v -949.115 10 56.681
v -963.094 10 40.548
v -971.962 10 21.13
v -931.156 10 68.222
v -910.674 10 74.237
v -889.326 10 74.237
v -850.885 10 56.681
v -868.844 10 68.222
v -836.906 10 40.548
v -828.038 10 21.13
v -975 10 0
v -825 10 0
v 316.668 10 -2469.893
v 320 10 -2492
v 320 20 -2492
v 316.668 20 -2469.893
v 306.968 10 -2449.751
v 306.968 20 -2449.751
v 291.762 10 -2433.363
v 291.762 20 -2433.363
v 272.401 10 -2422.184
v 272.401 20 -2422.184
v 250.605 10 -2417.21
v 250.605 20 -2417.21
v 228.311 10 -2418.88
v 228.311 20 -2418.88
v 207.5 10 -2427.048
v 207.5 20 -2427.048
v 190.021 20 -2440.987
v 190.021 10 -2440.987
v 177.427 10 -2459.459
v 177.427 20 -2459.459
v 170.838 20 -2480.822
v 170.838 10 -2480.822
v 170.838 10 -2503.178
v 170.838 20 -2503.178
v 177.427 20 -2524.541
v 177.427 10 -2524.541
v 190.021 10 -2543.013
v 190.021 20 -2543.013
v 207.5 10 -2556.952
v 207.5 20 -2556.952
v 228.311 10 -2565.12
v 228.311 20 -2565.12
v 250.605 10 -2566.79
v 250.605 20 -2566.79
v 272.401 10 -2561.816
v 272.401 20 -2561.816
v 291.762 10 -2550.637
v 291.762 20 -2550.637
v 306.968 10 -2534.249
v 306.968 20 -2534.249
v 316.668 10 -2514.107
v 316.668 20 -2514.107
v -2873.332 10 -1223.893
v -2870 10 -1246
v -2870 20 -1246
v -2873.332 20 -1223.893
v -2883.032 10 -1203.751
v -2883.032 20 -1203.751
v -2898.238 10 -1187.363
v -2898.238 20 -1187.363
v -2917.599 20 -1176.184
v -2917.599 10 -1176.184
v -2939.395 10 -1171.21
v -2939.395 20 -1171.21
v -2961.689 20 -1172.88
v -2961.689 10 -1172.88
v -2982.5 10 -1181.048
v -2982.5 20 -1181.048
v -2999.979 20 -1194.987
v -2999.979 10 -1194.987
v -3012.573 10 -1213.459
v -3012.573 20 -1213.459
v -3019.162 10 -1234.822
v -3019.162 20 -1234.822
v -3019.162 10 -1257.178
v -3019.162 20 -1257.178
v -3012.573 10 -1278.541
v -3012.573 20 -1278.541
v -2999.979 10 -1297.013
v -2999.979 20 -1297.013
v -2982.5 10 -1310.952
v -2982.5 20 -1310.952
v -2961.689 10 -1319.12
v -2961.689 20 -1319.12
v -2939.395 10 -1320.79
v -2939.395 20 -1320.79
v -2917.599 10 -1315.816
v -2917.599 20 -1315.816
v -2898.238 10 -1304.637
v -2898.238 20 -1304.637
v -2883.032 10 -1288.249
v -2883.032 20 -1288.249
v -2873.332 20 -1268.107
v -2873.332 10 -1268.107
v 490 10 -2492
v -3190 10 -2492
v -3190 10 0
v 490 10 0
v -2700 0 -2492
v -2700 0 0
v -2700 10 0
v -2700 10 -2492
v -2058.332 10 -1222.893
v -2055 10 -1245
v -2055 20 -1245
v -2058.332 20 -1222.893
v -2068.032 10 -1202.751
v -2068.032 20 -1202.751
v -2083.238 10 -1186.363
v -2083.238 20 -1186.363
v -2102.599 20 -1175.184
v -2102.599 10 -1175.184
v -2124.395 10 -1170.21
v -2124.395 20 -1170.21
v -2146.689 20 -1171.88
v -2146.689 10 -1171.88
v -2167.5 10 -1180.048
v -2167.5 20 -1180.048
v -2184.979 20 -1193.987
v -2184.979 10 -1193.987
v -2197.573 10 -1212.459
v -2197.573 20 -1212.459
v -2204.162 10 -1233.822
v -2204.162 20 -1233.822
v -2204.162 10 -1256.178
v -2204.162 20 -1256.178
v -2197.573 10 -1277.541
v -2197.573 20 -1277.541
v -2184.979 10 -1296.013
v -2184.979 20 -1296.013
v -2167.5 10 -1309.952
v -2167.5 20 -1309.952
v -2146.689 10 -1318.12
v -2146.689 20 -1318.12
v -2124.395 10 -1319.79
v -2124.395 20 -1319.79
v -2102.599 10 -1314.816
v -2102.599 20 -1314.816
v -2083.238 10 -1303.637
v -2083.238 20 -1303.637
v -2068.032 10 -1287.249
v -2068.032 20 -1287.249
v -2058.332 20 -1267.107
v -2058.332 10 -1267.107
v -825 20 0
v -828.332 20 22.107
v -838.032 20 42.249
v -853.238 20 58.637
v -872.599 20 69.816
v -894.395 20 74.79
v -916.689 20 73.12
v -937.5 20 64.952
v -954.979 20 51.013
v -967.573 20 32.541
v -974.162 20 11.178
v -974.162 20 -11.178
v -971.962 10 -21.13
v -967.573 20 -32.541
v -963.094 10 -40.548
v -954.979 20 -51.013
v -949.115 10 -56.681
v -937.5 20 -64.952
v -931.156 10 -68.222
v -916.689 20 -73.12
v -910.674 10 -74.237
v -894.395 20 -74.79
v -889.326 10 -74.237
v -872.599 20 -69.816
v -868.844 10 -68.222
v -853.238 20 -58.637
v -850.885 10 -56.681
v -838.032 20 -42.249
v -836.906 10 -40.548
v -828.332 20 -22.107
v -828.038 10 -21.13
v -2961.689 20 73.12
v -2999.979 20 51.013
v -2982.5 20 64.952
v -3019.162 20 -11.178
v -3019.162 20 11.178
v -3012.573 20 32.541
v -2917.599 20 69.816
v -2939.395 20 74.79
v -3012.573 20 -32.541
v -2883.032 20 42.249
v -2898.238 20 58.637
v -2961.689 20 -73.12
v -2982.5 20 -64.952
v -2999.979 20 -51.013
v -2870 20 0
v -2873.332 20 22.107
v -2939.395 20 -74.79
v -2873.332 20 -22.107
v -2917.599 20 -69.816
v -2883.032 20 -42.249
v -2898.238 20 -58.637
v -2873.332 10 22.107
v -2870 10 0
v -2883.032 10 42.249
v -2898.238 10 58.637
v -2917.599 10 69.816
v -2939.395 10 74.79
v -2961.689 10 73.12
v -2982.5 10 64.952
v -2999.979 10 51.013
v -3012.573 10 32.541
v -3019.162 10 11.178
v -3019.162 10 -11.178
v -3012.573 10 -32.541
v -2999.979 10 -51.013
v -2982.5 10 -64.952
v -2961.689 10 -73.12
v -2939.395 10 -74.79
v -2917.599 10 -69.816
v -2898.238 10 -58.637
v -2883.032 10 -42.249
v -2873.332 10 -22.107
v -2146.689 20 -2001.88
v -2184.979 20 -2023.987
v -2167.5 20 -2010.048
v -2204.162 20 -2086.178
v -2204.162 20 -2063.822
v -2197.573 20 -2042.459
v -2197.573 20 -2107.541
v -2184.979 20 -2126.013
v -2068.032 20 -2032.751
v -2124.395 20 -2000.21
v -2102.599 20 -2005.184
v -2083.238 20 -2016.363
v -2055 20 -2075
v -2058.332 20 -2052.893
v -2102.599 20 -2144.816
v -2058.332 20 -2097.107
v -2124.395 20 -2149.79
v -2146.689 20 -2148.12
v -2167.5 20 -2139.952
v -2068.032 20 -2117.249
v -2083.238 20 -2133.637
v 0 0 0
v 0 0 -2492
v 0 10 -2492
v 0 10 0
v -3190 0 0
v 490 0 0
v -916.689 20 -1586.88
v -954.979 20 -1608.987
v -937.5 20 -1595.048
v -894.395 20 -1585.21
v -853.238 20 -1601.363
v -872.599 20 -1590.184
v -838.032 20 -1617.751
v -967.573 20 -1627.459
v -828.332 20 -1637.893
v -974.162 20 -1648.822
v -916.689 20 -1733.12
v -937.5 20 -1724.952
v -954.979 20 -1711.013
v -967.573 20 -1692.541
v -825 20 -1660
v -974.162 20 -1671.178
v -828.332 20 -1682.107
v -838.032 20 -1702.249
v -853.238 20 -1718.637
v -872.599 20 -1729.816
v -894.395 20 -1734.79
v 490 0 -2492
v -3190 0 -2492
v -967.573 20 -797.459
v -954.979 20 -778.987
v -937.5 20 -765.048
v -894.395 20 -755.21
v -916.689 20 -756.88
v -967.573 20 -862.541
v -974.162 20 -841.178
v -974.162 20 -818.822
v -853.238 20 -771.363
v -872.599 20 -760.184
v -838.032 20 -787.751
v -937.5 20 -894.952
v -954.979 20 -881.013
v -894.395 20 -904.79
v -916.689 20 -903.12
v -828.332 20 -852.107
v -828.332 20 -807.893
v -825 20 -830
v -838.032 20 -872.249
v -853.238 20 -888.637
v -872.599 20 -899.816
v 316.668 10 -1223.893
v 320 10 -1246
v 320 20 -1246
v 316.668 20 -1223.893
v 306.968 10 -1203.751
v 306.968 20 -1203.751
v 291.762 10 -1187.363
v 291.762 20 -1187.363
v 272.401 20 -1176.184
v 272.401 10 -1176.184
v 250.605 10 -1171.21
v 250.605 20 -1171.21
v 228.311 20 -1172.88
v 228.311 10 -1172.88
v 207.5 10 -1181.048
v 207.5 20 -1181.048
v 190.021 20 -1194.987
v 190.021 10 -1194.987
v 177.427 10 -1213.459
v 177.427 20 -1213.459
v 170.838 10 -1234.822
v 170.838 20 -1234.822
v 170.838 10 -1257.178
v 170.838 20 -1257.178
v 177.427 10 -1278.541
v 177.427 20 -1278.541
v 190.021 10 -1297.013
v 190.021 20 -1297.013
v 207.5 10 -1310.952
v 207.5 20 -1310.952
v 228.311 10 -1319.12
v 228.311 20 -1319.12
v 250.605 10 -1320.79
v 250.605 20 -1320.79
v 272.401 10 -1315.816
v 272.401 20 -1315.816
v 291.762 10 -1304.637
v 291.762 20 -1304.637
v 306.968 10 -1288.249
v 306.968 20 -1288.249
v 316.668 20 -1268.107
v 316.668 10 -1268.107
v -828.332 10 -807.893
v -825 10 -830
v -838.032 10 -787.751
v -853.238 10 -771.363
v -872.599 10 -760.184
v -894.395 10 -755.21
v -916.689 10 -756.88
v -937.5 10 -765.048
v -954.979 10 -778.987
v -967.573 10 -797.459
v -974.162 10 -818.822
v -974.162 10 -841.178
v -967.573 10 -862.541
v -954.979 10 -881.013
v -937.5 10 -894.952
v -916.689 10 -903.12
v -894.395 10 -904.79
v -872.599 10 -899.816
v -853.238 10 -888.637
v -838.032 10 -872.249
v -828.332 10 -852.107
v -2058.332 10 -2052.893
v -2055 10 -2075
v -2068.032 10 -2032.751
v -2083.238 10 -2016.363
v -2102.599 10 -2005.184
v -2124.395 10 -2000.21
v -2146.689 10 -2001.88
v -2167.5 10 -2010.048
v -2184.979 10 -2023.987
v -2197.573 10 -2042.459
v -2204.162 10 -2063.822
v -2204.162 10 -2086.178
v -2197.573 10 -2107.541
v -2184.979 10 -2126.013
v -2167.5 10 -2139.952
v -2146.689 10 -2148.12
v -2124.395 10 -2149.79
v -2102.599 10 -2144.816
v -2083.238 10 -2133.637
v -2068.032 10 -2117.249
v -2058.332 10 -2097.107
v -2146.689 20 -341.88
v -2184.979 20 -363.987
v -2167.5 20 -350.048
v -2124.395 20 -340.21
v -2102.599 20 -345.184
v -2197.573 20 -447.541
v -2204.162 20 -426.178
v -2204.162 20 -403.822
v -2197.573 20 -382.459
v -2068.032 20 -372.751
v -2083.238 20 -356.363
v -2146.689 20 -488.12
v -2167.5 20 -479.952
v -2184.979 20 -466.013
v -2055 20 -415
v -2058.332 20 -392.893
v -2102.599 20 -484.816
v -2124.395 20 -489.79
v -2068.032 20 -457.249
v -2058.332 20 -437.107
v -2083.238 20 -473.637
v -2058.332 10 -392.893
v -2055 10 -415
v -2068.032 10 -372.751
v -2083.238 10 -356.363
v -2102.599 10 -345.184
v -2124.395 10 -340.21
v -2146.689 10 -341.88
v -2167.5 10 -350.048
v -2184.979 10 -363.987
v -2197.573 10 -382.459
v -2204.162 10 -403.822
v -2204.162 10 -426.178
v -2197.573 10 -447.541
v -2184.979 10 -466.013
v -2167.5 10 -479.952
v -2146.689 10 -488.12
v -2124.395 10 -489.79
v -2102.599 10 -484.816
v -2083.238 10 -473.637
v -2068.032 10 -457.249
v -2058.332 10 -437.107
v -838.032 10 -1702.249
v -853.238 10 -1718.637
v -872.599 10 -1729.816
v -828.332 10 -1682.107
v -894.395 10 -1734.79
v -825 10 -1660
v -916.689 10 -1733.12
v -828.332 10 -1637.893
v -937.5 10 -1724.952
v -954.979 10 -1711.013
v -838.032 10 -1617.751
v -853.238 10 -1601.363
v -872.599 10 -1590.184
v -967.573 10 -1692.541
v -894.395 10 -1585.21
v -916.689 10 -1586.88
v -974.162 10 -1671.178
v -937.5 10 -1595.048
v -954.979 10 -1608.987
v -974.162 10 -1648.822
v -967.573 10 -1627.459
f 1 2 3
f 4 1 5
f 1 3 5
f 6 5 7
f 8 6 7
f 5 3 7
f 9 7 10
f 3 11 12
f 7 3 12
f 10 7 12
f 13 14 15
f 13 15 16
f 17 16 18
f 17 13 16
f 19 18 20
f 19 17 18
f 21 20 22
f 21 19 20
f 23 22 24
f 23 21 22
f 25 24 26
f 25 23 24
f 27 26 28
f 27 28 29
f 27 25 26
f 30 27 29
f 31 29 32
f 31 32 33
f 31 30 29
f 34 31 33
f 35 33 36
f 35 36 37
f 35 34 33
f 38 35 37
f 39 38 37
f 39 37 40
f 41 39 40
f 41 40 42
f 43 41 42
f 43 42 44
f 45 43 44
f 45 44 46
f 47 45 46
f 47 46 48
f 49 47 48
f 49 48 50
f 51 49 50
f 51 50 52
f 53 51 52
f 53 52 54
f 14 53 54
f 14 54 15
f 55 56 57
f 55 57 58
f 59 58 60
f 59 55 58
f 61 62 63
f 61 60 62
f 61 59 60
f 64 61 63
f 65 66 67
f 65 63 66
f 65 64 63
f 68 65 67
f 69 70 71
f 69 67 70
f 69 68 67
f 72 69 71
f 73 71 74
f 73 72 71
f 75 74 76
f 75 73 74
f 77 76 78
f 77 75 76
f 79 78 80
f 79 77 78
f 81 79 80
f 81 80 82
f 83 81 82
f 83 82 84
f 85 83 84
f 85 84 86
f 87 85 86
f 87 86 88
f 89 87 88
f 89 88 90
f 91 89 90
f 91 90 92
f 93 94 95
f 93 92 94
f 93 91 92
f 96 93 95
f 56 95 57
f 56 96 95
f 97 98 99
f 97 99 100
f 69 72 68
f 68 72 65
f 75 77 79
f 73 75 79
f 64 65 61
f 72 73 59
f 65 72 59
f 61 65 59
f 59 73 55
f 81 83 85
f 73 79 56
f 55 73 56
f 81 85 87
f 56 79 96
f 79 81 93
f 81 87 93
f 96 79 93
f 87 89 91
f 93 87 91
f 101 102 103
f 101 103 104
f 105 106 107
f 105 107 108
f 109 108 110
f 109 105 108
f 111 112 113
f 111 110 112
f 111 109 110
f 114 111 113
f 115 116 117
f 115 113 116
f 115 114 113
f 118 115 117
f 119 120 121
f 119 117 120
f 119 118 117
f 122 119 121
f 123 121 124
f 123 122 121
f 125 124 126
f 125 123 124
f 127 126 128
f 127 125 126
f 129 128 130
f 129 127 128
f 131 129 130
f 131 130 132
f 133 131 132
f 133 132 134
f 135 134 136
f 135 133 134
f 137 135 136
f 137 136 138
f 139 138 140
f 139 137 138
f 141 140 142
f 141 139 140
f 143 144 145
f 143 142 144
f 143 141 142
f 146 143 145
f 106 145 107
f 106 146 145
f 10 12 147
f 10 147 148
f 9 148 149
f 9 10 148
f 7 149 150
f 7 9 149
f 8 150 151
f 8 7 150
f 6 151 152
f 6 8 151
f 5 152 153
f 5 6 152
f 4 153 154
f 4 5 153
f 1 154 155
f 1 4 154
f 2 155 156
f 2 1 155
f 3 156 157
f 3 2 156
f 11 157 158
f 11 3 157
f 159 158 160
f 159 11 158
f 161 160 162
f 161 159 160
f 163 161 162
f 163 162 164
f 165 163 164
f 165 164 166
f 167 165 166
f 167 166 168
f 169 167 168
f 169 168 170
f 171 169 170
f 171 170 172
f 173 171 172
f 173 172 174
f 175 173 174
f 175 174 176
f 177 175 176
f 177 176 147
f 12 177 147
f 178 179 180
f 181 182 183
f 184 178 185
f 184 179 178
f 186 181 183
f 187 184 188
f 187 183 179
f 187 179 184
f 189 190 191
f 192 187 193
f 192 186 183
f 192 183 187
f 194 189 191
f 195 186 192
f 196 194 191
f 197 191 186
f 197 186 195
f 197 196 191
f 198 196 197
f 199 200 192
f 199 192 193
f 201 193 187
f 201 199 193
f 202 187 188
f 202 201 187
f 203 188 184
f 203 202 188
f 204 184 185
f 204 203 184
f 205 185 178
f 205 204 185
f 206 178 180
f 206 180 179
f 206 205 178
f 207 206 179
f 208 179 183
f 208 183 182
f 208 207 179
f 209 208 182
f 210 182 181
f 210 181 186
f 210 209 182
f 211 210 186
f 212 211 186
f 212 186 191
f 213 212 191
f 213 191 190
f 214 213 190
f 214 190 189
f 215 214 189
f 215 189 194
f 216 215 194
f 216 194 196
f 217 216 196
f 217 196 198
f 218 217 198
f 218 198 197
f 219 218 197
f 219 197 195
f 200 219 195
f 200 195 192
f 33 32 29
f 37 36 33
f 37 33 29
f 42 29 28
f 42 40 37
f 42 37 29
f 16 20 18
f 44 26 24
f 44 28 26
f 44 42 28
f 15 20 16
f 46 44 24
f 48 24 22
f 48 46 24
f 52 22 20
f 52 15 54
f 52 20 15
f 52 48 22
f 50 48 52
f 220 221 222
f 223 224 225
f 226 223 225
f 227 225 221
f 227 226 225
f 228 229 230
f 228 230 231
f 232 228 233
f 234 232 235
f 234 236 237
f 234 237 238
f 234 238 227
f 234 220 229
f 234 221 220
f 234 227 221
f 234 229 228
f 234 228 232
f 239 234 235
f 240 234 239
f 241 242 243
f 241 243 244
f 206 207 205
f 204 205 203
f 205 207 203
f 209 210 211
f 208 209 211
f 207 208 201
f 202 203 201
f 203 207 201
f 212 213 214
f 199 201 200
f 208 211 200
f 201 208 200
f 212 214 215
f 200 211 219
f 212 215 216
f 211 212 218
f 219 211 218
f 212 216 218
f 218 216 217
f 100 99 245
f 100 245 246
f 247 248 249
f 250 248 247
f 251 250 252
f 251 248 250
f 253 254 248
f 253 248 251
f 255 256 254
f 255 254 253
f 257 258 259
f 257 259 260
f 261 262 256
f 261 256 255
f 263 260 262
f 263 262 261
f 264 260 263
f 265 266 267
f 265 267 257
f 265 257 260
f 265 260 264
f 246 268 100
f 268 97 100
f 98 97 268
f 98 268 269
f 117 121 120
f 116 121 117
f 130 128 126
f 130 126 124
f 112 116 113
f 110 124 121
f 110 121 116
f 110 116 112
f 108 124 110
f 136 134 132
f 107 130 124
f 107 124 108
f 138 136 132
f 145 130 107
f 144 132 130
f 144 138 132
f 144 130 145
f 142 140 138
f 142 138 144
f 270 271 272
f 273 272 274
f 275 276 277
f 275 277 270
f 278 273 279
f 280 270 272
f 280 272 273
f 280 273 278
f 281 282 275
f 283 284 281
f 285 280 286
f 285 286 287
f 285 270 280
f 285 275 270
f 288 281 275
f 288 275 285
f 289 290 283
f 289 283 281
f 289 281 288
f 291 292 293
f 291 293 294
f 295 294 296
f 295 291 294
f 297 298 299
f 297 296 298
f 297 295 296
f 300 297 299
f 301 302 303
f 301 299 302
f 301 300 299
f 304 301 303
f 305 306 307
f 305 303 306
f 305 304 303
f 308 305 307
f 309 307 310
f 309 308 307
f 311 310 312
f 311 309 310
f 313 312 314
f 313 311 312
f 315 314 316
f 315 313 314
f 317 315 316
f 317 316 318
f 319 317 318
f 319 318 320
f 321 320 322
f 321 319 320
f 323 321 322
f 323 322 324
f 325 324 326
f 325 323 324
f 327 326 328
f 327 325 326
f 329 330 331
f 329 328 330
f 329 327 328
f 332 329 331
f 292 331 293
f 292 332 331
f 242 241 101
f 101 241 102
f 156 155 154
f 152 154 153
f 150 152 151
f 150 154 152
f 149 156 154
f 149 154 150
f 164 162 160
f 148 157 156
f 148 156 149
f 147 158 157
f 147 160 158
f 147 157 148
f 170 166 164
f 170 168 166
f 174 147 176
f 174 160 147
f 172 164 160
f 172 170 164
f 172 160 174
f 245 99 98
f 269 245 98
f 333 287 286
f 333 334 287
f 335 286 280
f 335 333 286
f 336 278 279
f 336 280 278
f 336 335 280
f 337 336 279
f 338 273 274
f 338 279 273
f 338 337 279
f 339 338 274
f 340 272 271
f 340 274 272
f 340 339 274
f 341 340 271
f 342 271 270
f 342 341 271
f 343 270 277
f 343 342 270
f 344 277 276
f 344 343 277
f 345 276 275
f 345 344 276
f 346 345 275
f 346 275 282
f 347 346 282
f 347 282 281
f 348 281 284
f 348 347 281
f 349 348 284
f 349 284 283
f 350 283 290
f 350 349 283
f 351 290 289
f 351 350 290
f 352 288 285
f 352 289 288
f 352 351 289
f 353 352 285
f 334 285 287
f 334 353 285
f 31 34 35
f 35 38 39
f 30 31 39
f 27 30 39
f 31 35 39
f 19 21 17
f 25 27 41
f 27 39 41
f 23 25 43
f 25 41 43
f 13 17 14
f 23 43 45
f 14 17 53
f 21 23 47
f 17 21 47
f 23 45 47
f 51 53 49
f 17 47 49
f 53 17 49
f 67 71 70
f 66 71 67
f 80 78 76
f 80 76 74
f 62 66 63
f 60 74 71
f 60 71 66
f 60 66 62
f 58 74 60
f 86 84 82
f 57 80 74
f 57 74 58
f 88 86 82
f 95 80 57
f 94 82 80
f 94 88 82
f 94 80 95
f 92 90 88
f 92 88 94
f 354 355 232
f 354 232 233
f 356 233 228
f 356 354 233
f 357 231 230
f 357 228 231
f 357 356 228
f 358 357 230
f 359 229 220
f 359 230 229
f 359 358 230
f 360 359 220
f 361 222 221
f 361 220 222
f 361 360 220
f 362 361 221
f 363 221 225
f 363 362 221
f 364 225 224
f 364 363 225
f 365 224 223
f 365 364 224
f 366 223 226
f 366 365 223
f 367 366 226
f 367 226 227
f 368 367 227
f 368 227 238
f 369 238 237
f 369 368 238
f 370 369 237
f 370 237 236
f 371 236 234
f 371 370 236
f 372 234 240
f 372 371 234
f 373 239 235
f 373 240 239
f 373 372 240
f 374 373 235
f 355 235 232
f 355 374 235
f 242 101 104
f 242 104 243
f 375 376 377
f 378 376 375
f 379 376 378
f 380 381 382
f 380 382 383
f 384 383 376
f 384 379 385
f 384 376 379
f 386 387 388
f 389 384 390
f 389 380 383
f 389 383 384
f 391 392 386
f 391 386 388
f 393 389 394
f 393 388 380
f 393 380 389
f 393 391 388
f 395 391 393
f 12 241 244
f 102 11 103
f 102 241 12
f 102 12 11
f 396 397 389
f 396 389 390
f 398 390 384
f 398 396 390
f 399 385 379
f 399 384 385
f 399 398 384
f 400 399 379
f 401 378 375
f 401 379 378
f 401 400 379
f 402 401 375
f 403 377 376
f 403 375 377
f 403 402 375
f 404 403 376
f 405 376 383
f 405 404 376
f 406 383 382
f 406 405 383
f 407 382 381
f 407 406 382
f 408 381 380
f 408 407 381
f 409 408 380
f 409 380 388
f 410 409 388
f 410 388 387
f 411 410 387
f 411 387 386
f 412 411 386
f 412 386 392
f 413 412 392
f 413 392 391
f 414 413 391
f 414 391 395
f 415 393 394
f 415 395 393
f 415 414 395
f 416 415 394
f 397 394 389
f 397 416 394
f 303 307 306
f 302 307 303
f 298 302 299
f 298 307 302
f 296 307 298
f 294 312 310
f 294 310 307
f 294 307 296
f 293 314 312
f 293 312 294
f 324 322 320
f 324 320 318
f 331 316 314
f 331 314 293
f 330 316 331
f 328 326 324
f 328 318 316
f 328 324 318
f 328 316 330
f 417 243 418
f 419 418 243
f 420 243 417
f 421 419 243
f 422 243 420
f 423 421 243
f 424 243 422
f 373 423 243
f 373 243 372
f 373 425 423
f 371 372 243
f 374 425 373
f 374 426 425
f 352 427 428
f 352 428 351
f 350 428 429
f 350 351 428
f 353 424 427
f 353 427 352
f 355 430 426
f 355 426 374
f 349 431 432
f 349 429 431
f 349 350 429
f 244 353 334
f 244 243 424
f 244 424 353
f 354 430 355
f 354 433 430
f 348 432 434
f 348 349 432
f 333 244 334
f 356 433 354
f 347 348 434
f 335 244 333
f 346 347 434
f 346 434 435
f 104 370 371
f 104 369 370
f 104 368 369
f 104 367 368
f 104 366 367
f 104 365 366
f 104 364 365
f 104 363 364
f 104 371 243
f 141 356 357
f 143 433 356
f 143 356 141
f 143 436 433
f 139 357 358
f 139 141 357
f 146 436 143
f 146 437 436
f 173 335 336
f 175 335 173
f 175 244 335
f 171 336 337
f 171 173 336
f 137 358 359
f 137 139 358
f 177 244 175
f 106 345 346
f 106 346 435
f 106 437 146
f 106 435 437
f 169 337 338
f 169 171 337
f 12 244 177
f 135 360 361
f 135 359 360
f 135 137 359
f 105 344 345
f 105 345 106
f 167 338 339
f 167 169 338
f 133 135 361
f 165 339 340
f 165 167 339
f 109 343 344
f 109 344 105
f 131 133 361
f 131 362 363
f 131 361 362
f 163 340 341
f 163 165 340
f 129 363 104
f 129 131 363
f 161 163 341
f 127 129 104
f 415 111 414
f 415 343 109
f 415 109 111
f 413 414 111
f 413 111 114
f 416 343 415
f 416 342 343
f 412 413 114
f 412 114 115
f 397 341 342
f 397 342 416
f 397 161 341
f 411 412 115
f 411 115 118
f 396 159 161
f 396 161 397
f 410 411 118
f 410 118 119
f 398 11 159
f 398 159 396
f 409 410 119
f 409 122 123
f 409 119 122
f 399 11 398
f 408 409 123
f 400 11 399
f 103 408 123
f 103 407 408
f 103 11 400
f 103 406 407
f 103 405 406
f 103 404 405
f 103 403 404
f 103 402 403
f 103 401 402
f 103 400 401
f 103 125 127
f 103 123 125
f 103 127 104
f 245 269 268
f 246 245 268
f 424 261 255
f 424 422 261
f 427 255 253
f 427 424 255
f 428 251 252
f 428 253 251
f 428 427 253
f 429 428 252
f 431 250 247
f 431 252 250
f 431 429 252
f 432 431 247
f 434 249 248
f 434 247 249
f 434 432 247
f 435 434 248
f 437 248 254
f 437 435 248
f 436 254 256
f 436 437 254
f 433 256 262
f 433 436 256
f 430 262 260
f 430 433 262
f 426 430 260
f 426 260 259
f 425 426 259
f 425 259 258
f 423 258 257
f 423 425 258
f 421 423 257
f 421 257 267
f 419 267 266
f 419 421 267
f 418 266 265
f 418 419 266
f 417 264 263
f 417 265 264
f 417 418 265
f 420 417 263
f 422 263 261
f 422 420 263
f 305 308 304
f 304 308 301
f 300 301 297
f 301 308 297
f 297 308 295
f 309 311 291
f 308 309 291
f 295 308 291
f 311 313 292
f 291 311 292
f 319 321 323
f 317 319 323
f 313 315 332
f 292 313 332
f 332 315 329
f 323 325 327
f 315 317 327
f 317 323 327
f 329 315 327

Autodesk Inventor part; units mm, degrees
ref_plane "YZ Plane" through (0, 0, 0) normal (1, 0, 0) x (0, 1, 0)
ref_plane "XZ Plane" through (0, 0, 0) normal (0, 1, 0) x (-1, 0, 0)
ref_plane "XY Plane" through (0, 0, 0) normal (0, 0, 1) x (1, 0, 0)
sketch "Sketch1" plane through (0, 0, 0) normal (0, 1, 0) x (-1, 0, 0)
  line L0 (0, 0) -> (2700, 0)
  line L1 (2700, 0) -> (2700, -2492)
  line L2 (2700, -2492) -> (0, -2492)
  line L3 (0, -2492) -> (0, 0)
  dimension "d0" = 2700
  dimension "d1" = 2492
extrude "Extrusion1" add sketch "Sketch1" along normal blind 10
sketch "Sketch2" plane through (0, 10, 0) normal (0, 1, 0) x (1, 0, 0)
  line L0 (-2700, 2492) -> (-2700, 0) projected
  line L1 (-2700, 0) -> (-3190, 0)
  line L2 (-3190, 0) -> (-3190, 2492)
  line L3 (-3190, 2492) -> (-2700, 2492)
  line L4 (-2700, 2492) -> (-2700, 0)
  line L5 (0, 2492) -> (-2700, 2492) projected
  line L6 (0, 0) -> (0, 2492) projected
  line L7 (0, 2492) -> (490, 2492)
  line L8 (490, 2492) -> (490, 0)
  line L9 (490, 0) -> (0, 0)
  line L10 (0, 0) -> (0, 2492)
  line L11 (-2700, 0) -> (0, 0) projected
  dimension "d4" = 490
extrude "Extrusion2" add sketch "Sketch2" against normal blind 10 separate body
sketch "Sketch3" plane through (0, 10, 0) normal (0, 1, 0) x (1, 0, 0)
  circle A0 centre (245, 1246) radius 75
  line L0 (-3190, 2492) -> (490, 2492) projected
  circle A1 centre (245, 2492) radius 75
  circle A2 centre (-900, 0) radius 75
  circle A3 centre (-900, 830) radius 75
  circle A4 centre (-900, 1660) radius 75
  circle A5 centre (-2130, 415) radius 75
  circle A6 centre (-2130, 1245) radius 75
  circle A7 centre (-2130, 2075) radius 75
  circle A8 centre (-2945, 0) radius 75
  circle A9 centre (-2945, 1246) radius 75
  line L1 (0, 0) -> (0, 2492) projected
  line L2 (-3190, 0) -> (490, 0) projected
  line L3 (-2700, 2492) -> (-2700, 0) projected
  dimension "d7" = 150
  dimension "d8" = 900
  dimension "d9" = 2130
  dimension "d10" = 830
  dimension "d11" = 830
  dimension "d12" = 415
  dimension "d13" = 830
  dimension "d14" = 830
  dimension "d15" = 1246
  dimension "d16" = 245
  dimension "d17" = 245
extrude "Extrusion3" add sketch "Sketch3" along normal blind 10 contours A0 | A1 L0 | L0 A1 | A8 L2 | L2 A8 | L2 A2 | A2 L2 | A3 | A4 | A5 | A6 | A7 | A9 bodies 1
properties part number "Croqui Vaso"
